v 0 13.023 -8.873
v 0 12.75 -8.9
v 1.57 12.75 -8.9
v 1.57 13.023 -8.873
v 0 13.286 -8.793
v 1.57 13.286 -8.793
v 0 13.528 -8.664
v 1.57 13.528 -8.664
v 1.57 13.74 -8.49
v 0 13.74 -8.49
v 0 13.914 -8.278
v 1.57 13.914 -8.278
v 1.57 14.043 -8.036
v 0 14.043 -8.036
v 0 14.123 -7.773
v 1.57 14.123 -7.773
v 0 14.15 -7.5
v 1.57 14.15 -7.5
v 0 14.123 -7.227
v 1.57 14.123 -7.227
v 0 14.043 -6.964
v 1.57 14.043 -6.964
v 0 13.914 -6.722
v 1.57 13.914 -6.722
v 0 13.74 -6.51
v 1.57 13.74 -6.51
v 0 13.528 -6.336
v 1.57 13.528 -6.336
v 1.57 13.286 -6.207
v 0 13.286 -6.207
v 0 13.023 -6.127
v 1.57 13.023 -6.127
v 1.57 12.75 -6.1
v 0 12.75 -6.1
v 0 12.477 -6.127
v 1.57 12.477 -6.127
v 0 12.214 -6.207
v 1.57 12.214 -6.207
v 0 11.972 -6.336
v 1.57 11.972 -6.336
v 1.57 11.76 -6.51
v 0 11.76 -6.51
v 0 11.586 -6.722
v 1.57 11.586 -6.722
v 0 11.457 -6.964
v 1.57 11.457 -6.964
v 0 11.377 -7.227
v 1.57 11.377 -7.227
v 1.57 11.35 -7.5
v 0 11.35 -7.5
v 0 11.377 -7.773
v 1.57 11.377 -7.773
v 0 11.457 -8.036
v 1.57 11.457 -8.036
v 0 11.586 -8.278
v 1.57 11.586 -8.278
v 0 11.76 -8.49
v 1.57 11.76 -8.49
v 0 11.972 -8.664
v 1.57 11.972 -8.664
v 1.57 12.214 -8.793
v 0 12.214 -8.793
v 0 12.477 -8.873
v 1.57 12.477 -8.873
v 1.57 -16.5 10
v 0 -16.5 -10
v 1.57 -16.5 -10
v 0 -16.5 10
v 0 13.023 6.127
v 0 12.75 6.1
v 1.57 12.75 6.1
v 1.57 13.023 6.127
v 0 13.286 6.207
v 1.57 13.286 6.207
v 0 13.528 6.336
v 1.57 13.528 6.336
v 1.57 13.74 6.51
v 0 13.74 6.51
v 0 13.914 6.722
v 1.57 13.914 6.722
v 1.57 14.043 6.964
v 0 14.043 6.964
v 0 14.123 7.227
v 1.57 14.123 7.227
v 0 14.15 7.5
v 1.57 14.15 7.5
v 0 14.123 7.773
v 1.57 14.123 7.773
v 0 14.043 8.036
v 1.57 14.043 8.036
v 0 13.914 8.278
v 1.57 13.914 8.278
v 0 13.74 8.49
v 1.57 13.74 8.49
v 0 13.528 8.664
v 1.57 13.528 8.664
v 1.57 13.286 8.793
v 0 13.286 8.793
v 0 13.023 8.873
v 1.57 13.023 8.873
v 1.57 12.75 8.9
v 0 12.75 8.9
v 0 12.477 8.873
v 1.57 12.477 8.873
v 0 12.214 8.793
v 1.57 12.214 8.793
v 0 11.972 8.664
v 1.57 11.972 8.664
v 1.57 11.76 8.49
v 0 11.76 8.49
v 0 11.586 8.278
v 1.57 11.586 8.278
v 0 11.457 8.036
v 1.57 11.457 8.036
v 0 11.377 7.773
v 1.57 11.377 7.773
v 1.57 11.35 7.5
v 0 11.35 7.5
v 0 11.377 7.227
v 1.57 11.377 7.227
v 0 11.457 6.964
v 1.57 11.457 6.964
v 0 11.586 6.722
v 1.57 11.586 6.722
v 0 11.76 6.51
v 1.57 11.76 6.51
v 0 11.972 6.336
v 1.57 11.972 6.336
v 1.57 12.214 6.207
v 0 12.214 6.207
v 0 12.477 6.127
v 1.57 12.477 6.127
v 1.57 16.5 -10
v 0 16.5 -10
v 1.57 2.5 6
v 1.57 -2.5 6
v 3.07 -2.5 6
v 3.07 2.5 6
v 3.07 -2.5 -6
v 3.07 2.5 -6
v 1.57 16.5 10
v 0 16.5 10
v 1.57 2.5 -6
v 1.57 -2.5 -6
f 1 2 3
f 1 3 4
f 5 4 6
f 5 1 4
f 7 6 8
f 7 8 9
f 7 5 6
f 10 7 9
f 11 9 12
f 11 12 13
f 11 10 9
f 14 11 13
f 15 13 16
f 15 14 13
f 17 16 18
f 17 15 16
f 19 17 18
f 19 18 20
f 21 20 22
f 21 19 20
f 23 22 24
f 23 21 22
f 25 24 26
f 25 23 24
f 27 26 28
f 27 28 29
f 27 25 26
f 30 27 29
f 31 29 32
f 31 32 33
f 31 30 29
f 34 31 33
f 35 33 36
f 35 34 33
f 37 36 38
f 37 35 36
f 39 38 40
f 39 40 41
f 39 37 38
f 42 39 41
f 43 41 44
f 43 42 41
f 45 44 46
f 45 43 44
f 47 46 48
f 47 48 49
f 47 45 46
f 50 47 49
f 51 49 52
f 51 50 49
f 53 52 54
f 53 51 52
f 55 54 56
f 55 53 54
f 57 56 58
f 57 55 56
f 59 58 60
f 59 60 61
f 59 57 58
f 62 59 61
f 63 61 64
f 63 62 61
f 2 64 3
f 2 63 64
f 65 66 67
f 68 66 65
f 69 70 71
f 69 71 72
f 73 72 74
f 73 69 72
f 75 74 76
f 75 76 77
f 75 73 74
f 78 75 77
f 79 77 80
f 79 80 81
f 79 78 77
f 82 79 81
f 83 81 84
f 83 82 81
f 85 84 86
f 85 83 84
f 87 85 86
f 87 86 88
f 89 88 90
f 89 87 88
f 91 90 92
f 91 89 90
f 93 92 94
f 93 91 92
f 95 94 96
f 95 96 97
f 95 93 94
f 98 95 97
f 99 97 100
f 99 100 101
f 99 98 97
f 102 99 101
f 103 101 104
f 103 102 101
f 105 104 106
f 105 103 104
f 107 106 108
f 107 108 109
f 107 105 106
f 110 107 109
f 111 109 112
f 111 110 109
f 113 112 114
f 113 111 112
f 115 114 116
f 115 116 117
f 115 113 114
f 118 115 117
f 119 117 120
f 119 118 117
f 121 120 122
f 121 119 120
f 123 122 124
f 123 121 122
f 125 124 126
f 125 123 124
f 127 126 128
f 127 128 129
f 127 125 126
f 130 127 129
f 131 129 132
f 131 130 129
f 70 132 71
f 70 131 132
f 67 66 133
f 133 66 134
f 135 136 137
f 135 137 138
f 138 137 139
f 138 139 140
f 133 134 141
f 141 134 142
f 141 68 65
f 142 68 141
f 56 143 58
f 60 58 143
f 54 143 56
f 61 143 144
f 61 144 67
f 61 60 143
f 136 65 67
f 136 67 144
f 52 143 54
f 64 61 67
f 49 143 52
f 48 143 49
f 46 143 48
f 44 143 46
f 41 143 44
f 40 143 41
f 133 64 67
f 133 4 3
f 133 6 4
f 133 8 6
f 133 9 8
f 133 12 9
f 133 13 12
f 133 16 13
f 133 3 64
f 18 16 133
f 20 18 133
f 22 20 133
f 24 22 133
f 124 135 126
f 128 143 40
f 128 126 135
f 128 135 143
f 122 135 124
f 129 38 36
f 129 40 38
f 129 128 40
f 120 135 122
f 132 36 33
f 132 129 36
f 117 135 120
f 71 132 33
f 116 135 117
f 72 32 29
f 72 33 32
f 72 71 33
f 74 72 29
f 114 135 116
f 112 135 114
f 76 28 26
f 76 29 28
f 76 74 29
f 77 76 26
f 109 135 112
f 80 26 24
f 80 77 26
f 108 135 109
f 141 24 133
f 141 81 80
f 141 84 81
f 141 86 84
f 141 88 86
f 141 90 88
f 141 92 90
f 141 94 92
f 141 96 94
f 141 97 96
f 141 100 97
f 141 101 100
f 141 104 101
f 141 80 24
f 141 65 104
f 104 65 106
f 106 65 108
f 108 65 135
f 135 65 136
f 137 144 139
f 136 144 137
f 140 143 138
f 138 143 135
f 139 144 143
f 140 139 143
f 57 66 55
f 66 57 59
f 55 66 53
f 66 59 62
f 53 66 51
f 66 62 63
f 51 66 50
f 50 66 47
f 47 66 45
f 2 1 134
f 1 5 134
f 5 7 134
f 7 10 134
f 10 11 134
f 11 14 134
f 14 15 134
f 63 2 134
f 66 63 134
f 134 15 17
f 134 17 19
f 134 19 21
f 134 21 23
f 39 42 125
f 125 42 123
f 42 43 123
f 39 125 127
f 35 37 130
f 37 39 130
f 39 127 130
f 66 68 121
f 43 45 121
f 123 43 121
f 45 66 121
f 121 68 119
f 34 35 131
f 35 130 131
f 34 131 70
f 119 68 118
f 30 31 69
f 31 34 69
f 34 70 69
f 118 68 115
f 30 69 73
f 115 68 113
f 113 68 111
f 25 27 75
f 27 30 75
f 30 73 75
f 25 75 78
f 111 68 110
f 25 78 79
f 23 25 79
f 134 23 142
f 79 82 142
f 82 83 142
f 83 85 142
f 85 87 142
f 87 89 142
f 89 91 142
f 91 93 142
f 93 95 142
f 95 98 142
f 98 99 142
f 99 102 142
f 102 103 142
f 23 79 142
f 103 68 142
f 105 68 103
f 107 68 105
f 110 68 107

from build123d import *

# Parameters (mm, degrees)
SKETCH1_W           = 33
SKETCH1_H           = 20
SKETCH1_R           = 1.4
BOSS_EXTRUDE1_DEPTH = 1.57
SKETCH2_W           = 5
SKETCH2_H           = 12
BOSS_EXTRUDE2_DEPTH = 1.5


with BuildPart() as part:
    # Sketch1 → Boss-Extrude1 (new body)
    with BuildSketch(Plane.YZ):
        Rectangle(SKETCH1_W, SKETCH1_H)
        with Locations(Location((12.75, 7.5, 0), (0, 0, 270))):
            Circle(SKETCH1_R, mode=Mode.SUBTRACT)
        with Locations(Location((12.75, -7.5, 0), (0, 0, 270))):
            Circle(SKETCH1_R, mode=Mode.SUBTRACT)
    extrude(amount=BOSS_EXTRUDE1_DEPTH)

    # Sketch2 → Boss-Extrude2 (add)
    with BuildSketch(Plane.YZ.offset(1.57)):
        Rectangle(SKETCH2_W, SKETCH2_H)
    extrude(amount=BOSS_EXTRUDE2_DEPTH)


solid = part.part
